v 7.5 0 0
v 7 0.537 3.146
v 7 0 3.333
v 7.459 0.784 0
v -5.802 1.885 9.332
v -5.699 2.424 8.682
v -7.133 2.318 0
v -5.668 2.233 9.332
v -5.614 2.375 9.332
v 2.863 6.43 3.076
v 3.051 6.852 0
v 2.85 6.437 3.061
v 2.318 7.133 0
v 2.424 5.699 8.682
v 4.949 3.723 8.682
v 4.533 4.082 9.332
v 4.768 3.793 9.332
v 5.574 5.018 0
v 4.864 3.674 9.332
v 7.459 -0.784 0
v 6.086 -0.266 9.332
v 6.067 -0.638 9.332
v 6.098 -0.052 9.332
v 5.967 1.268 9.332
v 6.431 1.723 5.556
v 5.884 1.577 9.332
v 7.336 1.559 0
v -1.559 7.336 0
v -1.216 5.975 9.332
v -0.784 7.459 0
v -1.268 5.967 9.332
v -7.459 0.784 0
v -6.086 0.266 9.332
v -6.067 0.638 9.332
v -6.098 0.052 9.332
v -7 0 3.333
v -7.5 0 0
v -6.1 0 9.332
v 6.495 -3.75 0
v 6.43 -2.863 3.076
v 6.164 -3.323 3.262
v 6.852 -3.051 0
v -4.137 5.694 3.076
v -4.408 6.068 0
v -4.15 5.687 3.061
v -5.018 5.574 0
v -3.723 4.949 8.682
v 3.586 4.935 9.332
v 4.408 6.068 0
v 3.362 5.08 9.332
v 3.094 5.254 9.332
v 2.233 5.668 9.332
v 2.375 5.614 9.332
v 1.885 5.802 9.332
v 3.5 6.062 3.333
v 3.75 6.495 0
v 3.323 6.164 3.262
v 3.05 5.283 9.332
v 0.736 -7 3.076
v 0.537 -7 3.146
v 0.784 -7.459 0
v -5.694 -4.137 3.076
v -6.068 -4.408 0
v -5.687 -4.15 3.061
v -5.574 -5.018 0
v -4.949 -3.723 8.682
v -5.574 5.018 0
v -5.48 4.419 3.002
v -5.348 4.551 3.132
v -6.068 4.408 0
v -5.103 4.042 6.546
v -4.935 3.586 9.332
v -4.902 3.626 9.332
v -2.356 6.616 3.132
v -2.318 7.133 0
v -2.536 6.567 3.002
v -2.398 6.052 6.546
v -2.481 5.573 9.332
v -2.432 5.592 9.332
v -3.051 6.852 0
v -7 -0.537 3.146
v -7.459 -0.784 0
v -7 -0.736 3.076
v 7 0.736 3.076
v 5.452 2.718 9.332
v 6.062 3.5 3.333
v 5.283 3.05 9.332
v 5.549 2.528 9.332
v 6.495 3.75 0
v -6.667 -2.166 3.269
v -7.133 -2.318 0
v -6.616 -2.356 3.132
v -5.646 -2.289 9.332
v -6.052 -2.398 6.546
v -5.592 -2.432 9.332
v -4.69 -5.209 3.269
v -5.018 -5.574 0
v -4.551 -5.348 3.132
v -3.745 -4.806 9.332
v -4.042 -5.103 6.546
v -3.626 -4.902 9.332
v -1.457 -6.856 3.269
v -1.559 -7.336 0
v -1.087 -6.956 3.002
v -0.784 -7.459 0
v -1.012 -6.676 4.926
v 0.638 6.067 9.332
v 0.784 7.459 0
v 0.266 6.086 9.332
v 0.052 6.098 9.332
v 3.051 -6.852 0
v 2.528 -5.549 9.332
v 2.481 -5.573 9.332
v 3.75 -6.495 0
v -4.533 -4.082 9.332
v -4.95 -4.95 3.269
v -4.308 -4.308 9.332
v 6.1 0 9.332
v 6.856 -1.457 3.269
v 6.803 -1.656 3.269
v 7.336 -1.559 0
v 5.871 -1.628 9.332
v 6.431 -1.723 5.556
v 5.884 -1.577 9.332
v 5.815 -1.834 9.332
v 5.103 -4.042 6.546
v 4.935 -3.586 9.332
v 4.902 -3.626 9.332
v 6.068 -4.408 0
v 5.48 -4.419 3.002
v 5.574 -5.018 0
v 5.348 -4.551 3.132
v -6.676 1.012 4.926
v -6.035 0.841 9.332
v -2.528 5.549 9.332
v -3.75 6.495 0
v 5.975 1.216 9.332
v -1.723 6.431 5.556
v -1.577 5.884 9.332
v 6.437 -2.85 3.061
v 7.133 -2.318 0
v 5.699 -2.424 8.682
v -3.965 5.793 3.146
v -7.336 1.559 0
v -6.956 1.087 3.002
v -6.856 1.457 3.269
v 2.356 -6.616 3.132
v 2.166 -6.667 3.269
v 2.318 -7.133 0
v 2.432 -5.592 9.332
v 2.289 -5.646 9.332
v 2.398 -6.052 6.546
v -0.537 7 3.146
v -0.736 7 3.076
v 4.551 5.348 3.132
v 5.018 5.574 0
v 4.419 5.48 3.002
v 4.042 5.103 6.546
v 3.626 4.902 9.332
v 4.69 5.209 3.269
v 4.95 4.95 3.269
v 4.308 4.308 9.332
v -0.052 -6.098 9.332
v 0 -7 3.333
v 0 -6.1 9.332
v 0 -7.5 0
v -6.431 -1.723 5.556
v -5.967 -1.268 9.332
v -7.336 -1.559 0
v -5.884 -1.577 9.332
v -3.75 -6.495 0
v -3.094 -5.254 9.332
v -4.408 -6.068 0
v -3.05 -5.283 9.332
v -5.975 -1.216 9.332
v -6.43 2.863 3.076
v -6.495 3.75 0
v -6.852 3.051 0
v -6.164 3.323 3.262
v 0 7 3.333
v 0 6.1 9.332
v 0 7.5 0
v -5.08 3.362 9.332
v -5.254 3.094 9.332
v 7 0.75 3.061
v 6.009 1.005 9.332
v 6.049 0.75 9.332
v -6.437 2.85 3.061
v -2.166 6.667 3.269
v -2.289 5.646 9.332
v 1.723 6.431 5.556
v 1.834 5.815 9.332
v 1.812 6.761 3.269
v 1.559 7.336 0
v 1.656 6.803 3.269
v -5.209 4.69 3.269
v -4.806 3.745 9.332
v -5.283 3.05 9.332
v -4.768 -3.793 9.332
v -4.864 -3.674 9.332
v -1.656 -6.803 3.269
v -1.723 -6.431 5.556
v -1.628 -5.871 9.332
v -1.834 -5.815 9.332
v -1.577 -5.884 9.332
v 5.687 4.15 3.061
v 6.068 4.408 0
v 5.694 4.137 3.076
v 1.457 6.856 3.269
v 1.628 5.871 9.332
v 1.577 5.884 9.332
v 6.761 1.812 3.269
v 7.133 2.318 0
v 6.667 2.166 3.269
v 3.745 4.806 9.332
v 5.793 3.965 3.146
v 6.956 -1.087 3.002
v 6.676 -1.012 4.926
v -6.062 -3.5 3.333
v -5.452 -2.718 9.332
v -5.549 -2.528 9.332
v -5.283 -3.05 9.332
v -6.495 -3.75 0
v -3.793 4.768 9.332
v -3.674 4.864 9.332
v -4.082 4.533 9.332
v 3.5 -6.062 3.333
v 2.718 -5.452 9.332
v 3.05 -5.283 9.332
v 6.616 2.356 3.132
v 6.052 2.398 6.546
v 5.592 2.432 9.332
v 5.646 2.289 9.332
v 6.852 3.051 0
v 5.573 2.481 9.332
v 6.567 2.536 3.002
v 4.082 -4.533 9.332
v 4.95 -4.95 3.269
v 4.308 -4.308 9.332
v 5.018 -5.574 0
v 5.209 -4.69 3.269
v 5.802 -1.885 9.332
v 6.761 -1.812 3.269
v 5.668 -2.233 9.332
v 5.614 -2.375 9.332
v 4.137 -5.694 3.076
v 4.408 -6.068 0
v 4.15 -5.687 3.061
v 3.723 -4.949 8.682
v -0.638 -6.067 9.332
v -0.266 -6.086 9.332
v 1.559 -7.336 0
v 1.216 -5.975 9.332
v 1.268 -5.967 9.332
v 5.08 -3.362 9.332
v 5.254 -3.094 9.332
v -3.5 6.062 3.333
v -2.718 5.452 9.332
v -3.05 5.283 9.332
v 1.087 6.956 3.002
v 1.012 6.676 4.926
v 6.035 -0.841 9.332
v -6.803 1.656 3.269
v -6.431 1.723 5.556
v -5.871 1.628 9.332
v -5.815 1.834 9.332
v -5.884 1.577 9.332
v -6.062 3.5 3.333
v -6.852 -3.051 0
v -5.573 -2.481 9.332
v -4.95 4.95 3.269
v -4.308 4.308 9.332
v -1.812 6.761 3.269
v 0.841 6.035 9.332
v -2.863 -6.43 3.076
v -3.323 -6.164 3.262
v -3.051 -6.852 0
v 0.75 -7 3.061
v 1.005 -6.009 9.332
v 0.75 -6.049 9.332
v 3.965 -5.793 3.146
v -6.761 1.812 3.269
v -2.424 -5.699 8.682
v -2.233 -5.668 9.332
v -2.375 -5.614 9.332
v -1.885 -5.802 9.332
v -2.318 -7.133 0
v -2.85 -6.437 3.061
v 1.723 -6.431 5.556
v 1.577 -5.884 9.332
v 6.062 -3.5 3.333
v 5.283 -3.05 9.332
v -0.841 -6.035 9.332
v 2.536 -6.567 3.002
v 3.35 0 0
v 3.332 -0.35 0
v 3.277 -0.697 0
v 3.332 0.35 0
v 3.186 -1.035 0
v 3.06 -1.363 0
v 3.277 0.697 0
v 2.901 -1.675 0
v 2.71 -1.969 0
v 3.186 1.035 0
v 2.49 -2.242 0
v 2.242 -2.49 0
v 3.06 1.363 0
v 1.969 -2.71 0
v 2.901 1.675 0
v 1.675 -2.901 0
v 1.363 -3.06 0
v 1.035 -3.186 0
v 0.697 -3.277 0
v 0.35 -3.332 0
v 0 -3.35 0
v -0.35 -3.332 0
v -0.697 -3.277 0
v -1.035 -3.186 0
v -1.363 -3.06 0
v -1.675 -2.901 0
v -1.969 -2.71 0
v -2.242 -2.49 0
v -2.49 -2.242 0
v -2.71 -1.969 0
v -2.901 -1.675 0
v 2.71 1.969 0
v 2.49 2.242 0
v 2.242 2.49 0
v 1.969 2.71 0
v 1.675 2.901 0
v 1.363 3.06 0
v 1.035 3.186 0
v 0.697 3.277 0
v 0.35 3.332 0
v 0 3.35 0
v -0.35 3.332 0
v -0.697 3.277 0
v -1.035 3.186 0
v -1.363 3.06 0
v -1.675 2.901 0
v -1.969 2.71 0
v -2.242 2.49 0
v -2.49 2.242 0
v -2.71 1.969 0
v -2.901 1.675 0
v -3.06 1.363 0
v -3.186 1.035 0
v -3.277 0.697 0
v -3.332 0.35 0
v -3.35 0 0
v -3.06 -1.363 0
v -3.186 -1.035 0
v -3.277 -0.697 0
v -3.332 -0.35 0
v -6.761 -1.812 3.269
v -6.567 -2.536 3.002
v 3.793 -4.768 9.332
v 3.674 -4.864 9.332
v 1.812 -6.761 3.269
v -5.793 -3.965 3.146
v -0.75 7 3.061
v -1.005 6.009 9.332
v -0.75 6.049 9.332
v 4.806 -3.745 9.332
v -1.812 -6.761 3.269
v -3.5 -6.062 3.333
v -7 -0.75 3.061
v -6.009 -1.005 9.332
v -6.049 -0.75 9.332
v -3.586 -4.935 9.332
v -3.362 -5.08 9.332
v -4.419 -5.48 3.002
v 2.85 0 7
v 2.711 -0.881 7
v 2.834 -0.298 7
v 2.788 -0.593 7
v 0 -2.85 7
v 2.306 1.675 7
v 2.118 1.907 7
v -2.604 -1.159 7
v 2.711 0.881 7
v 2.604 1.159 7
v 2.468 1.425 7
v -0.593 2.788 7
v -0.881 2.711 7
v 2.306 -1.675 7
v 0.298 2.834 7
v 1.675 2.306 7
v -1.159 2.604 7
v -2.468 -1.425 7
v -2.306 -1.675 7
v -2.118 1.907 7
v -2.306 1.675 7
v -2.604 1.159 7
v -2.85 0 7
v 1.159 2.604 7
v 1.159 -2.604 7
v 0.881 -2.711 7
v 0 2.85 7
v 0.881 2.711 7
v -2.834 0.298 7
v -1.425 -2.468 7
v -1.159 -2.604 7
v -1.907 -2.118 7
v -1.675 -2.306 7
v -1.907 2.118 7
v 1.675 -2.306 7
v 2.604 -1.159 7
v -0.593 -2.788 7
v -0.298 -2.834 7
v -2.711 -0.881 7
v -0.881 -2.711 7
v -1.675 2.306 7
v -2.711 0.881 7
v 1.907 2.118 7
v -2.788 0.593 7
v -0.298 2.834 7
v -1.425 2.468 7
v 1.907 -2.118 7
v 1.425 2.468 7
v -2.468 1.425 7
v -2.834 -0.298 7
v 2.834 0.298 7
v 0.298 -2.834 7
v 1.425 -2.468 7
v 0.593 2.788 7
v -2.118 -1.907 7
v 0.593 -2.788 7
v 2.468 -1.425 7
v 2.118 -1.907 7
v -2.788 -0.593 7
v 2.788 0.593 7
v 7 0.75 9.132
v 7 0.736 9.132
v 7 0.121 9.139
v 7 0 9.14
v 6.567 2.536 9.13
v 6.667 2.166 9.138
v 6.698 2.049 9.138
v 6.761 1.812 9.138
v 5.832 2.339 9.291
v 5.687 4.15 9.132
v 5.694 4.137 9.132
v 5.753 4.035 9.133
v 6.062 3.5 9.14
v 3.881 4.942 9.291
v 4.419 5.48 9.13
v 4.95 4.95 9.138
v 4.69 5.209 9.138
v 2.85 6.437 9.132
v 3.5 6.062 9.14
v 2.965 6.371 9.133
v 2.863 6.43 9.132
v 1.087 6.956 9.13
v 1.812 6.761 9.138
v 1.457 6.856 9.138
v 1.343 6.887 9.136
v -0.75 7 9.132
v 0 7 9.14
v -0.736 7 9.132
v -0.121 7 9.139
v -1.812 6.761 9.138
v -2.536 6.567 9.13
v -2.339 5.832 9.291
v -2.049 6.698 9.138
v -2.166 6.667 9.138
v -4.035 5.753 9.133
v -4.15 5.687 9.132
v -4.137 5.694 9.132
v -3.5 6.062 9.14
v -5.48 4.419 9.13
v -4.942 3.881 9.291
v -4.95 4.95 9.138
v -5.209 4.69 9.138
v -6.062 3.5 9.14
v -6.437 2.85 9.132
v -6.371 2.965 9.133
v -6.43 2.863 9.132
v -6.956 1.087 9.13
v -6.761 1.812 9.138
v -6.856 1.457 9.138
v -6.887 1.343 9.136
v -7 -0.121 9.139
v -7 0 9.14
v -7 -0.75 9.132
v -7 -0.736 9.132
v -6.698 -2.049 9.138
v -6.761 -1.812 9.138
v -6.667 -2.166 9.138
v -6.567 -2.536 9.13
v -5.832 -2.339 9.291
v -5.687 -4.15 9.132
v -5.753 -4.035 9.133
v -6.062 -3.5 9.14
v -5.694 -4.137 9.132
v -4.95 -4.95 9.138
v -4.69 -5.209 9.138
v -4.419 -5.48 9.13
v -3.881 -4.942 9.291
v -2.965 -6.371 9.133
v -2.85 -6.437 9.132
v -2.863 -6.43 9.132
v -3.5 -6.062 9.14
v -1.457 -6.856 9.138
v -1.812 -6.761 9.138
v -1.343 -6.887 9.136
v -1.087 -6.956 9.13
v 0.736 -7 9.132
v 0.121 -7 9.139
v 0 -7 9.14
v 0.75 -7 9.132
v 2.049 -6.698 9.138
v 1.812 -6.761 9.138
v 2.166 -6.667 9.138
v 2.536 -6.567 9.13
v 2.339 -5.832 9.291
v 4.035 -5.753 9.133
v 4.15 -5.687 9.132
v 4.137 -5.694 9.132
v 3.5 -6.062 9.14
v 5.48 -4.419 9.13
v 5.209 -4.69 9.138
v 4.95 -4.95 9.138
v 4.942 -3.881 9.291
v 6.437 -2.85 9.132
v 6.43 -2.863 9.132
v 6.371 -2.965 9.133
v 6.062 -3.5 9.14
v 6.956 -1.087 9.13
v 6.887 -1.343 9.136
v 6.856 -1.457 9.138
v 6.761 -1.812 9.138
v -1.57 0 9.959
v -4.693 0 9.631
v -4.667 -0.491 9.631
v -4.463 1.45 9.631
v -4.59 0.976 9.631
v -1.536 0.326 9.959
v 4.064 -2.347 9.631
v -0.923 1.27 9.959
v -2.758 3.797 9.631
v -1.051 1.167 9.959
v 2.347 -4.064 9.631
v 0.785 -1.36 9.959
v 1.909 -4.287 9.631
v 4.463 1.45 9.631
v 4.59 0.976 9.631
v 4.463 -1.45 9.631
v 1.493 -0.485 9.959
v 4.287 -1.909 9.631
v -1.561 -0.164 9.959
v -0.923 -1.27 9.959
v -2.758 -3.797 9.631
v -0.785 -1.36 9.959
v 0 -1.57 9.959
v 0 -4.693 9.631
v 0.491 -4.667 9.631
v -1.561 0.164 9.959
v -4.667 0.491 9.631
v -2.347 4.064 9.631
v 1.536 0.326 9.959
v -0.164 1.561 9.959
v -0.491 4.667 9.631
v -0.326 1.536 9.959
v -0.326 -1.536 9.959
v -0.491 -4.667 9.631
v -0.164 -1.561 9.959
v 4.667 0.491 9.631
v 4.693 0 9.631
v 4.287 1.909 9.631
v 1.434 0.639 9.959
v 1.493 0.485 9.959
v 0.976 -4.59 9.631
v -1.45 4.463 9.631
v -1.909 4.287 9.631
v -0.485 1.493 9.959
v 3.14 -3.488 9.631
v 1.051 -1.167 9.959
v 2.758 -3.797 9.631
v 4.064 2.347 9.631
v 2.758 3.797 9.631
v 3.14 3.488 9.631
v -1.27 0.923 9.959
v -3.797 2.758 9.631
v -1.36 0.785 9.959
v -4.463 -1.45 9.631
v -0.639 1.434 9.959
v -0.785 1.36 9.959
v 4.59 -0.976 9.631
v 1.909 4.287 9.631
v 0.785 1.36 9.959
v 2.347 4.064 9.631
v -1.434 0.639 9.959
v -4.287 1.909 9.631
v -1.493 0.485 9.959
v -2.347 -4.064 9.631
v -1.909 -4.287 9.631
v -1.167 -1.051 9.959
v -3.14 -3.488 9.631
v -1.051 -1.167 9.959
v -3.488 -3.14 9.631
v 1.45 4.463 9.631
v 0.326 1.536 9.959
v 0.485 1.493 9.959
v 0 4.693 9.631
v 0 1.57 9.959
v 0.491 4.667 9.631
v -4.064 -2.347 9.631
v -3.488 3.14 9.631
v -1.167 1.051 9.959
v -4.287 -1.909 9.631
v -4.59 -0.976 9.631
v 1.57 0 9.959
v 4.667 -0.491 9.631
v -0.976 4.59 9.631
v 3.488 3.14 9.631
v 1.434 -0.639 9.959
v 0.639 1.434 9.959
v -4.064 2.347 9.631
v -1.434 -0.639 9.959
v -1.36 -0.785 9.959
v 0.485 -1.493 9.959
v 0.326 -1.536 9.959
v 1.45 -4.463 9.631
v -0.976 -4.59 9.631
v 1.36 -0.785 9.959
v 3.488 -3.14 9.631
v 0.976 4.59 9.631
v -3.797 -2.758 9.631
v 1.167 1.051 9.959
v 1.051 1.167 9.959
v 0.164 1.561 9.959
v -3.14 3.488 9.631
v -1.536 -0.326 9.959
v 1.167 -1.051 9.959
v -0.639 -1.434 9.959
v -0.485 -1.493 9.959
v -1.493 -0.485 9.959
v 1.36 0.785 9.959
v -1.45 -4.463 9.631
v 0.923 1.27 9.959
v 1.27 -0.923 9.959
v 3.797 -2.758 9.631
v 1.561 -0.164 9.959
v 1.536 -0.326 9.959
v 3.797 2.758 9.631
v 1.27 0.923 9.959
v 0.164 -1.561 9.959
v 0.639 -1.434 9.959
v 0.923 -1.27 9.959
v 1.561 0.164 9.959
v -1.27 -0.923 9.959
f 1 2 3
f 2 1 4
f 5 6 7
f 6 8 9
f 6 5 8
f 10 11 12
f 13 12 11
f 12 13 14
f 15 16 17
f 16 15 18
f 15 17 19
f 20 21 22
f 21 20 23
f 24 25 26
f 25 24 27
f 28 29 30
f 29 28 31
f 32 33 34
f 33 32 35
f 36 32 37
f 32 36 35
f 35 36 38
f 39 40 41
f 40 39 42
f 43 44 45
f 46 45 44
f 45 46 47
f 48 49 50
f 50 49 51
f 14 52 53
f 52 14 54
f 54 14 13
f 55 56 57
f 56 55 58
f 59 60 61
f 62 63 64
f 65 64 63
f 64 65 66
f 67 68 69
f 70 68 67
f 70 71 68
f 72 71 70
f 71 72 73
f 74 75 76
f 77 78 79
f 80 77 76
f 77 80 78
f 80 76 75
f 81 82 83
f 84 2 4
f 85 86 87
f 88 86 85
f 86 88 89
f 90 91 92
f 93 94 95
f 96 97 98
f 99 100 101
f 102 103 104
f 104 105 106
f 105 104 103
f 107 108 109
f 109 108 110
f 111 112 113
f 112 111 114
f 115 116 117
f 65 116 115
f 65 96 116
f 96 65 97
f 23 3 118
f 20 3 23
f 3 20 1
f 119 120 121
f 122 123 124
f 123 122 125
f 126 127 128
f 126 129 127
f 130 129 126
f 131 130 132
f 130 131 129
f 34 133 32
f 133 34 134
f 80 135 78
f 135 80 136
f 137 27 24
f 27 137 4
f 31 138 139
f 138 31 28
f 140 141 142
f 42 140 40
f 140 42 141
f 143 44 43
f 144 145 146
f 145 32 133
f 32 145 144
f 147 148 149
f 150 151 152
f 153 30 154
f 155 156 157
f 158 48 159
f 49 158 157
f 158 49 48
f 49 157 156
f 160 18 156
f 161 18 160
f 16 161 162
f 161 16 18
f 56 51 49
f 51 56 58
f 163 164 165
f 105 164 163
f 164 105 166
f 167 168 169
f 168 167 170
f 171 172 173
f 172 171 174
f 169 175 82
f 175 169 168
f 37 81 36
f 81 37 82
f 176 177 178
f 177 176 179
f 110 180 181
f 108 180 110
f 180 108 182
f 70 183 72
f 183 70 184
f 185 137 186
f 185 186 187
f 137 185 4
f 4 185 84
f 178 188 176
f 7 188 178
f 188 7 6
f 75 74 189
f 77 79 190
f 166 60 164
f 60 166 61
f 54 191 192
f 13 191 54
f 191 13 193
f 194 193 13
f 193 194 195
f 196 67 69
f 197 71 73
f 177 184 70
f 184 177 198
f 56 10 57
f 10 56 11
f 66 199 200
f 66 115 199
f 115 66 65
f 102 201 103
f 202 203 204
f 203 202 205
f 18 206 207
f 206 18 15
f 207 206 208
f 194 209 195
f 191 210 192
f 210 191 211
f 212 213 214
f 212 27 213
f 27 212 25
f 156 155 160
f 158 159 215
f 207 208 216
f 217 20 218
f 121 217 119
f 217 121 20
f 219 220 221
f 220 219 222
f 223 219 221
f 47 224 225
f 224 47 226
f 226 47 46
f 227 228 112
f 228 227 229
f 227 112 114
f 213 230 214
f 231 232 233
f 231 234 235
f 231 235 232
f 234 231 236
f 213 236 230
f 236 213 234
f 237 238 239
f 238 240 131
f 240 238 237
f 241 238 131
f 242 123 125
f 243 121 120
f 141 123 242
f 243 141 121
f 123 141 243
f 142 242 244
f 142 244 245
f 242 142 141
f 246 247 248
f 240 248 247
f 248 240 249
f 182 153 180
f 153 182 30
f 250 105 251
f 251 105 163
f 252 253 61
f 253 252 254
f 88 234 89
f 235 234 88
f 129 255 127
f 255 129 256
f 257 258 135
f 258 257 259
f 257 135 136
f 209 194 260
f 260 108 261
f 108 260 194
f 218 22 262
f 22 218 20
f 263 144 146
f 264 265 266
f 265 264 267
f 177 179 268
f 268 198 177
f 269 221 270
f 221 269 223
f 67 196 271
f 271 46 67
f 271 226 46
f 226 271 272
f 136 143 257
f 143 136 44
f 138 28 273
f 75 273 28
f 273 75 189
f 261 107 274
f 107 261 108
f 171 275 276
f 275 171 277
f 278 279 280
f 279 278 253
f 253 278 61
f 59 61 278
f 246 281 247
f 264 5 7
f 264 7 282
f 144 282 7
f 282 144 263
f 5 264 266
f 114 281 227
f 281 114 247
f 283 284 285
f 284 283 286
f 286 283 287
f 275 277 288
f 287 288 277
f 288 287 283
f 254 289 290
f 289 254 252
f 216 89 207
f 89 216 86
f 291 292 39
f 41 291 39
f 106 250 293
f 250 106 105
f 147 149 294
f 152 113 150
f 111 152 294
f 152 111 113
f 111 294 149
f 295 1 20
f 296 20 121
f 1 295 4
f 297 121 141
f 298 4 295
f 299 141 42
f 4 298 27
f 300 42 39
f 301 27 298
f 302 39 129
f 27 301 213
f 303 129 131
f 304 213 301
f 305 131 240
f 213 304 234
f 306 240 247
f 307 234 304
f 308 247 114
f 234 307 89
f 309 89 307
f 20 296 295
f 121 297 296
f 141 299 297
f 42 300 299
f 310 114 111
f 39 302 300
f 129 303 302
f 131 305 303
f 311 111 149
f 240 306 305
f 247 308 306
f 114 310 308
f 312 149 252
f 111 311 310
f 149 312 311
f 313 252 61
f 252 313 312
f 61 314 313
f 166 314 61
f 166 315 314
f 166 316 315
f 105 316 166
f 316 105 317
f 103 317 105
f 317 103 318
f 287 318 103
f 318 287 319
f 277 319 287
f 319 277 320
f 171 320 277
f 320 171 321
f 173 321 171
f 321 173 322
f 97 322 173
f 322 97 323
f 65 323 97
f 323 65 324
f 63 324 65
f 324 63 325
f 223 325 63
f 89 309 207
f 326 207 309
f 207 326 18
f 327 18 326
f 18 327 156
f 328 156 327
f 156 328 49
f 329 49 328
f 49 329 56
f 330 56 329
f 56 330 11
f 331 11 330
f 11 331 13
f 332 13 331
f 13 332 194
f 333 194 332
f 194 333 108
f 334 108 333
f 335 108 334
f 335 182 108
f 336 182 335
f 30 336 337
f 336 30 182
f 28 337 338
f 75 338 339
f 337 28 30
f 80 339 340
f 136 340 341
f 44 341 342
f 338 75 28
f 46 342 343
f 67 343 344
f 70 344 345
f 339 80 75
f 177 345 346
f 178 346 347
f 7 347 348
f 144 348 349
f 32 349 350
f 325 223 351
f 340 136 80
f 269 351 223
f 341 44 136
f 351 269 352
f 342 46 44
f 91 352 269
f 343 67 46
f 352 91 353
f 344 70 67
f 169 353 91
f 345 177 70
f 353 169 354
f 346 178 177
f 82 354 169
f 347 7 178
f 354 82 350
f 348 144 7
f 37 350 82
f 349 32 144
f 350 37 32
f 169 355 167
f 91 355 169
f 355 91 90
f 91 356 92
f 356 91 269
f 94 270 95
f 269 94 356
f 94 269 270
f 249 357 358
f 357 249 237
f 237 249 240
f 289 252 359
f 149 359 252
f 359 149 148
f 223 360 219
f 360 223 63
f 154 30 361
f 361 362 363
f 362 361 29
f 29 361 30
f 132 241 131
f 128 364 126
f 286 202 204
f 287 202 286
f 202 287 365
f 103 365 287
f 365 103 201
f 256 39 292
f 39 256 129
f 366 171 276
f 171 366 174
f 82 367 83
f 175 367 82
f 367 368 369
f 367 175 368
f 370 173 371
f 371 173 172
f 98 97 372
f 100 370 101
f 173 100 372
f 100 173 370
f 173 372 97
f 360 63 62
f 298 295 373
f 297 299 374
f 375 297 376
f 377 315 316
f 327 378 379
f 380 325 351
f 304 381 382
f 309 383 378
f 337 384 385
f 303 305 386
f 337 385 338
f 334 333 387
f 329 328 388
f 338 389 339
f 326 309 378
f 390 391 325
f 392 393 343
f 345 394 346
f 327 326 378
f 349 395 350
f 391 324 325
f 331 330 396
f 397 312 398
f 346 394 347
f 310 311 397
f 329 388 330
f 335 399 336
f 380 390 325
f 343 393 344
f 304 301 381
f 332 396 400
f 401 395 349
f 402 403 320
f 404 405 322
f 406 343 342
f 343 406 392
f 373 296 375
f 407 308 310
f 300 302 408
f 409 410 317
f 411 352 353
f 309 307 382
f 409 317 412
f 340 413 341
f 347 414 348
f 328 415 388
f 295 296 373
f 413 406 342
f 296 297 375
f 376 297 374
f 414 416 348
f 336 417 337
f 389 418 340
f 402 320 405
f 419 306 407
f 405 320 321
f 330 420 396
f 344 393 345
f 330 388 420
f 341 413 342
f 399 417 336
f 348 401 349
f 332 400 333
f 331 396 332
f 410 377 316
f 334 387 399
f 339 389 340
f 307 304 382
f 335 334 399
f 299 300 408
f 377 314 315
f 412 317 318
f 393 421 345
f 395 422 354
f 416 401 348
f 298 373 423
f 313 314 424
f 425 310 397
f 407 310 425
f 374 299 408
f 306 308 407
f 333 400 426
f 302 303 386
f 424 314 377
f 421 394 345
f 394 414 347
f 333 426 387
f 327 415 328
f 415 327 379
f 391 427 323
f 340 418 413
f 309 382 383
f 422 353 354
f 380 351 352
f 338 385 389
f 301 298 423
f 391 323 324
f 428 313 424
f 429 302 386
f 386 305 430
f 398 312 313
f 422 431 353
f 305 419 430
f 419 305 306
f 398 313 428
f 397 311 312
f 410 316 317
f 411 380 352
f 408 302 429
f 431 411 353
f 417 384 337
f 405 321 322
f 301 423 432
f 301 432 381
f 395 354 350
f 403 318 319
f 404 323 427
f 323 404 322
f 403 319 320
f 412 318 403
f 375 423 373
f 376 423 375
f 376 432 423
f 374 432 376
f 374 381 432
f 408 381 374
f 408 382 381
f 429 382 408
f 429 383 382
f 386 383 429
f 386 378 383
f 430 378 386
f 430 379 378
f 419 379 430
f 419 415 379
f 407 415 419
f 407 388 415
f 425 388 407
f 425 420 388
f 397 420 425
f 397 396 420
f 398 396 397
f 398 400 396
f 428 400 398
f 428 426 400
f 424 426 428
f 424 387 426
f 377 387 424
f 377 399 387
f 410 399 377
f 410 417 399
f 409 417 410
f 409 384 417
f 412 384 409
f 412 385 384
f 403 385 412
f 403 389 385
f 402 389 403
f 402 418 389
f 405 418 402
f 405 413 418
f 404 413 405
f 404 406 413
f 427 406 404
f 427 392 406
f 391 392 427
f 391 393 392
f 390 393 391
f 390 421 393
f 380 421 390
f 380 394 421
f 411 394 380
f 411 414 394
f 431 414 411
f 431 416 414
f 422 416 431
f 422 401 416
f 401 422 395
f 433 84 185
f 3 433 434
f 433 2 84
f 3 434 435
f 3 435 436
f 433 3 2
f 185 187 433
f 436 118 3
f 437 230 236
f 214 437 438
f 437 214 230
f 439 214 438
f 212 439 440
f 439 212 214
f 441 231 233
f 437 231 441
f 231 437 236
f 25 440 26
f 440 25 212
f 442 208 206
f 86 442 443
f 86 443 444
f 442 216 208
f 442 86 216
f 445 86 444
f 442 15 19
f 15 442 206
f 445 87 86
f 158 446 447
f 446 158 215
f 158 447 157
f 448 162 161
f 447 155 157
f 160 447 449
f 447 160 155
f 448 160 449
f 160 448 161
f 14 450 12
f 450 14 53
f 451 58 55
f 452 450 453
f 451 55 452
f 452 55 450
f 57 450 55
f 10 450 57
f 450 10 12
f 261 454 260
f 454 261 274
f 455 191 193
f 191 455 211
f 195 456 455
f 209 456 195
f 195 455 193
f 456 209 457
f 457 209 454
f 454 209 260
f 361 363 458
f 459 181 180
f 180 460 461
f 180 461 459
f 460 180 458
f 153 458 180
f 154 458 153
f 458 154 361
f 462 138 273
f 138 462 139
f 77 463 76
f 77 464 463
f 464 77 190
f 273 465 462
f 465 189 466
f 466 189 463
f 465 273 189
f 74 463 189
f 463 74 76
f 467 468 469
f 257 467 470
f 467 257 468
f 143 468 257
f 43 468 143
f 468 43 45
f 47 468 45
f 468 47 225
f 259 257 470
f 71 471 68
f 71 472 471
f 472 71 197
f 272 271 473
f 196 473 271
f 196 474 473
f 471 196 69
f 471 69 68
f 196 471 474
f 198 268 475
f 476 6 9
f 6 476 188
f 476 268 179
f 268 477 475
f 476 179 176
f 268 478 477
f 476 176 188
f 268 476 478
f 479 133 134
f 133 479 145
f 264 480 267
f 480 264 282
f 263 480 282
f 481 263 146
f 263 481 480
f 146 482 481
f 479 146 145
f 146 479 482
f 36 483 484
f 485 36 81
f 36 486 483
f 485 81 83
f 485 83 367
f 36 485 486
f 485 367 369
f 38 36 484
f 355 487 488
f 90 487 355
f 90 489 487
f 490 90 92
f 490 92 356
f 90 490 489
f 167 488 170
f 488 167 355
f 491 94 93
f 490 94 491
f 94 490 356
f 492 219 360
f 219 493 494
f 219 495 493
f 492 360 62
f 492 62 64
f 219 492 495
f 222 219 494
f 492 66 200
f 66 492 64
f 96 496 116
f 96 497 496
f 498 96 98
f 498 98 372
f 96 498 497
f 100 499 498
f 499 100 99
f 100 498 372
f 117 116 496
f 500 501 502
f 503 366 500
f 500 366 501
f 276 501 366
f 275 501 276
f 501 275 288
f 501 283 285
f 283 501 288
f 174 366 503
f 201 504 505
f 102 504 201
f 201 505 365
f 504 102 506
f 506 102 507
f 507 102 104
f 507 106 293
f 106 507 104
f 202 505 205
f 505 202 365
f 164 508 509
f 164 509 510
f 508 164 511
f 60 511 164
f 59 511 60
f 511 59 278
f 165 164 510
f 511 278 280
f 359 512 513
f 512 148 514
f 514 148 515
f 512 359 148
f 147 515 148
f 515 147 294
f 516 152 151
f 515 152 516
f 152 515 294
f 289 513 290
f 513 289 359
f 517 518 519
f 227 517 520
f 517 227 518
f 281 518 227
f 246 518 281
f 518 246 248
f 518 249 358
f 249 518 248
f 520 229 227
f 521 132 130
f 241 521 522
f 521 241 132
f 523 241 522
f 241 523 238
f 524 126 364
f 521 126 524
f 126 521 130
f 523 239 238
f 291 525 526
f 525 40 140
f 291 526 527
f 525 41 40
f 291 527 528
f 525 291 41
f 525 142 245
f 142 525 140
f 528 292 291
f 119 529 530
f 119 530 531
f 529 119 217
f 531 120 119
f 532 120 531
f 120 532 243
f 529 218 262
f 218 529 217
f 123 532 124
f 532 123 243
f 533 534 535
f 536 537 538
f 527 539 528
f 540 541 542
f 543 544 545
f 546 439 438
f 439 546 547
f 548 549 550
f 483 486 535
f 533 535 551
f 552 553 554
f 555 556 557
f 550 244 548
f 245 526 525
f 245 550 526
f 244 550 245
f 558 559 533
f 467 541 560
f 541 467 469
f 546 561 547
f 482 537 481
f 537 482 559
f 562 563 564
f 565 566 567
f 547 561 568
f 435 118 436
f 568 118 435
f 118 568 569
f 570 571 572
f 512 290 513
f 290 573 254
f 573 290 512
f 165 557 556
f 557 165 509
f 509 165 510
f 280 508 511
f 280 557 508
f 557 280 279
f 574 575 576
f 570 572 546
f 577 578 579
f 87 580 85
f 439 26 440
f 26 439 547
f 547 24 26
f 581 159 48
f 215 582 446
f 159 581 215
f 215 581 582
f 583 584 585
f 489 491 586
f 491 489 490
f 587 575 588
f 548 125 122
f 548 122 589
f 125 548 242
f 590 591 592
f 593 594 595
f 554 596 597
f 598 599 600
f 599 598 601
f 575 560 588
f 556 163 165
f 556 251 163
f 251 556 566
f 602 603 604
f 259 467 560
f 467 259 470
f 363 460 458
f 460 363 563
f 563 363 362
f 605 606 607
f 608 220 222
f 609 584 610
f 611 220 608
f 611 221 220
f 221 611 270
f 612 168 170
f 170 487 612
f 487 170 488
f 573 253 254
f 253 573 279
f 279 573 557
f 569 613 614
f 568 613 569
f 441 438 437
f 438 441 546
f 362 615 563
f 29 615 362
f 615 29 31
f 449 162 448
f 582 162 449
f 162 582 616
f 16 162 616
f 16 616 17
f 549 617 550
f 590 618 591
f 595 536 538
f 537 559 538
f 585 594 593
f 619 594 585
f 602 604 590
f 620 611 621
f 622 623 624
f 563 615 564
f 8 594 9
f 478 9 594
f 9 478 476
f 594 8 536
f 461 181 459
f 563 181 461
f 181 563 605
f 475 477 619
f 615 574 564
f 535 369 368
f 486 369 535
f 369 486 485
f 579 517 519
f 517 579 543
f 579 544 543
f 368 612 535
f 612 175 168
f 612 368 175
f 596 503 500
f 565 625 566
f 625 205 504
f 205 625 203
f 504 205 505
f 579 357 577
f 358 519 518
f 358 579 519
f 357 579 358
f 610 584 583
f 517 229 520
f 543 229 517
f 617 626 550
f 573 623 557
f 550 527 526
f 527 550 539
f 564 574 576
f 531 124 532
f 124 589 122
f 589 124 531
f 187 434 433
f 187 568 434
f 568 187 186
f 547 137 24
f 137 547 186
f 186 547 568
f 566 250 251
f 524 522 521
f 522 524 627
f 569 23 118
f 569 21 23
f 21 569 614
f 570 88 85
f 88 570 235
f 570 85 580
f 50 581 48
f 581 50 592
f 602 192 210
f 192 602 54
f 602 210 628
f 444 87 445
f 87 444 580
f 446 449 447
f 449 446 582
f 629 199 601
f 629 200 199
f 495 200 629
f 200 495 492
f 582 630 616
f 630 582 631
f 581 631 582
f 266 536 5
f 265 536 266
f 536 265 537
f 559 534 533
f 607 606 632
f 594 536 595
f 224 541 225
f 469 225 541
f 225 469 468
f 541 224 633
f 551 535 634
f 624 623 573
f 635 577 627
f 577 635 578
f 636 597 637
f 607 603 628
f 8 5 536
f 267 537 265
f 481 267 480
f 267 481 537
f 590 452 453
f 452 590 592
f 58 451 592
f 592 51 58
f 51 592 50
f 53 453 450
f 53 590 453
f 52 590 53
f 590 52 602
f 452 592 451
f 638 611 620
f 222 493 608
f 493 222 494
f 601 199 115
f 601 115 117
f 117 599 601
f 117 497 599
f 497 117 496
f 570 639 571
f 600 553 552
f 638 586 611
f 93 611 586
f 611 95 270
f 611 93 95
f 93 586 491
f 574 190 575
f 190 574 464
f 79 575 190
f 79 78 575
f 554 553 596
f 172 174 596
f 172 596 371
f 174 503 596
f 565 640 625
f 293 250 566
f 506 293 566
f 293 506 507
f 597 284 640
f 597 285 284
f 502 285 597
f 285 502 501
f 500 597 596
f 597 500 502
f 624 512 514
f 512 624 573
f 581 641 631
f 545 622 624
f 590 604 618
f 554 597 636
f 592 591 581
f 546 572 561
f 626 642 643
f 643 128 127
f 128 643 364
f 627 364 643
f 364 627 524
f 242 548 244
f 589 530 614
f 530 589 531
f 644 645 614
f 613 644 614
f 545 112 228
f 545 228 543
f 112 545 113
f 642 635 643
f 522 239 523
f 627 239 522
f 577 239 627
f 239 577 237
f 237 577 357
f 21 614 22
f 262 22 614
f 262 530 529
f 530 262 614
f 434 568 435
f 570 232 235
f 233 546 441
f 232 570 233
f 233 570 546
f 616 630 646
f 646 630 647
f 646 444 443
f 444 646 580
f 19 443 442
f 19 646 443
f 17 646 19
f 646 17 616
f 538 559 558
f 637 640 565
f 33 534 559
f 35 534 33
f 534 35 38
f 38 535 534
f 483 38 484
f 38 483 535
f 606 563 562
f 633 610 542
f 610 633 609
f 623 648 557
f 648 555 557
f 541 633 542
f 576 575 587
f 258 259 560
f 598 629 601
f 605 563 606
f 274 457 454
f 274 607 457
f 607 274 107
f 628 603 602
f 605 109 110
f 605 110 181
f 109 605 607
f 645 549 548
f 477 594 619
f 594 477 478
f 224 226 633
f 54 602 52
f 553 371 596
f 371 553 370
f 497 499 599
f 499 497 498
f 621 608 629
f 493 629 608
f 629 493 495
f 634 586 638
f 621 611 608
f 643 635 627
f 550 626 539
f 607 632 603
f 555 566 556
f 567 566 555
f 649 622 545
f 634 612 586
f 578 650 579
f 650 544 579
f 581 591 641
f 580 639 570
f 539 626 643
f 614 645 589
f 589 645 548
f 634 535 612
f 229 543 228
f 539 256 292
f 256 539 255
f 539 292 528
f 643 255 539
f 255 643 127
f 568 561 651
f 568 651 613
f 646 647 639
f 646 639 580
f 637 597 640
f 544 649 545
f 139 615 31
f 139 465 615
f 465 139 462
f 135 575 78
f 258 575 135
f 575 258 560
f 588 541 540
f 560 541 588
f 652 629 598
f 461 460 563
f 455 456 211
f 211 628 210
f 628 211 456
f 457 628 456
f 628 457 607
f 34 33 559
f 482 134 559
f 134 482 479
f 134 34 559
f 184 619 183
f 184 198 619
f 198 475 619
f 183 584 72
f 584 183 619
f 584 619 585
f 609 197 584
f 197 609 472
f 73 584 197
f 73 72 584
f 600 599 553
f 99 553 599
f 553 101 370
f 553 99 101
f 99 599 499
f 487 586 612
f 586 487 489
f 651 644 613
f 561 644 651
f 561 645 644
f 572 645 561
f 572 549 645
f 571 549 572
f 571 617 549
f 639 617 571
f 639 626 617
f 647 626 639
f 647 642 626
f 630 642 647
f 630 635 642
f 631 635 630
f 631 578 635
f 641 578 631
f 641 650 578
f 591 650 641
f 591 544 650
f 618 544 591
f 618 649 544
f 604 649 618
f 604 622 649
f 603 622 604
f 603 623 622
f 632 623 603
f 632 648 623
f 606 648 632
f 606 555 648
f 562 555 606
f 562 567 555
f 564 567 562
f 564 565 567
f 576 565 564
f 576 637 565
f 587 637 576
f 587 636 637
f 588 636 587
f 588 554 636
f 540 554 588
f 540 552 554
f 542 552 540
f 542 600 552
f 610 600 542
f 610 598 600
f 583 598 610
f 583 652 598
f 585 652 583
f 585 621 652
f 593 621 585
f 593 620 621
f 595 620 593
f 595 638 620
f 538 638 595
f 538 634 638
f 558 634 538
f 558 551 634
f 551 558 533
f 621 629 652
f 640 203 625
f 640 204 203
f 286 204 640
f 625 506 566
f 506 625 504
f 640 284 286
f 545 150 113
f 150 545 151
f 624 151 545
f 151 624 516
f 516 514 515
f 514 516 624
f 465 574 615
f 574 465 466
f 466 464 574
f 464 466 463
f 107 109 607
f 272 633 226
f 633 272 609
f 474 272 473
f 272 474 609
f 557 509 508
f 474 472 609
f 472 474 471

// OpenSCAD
surroundHeight= 10;
radius = 6;
innerRadius = 5.7/2;
deep = 7;

intersection(){

    union(){
	
	difference(){
		cylinder(r1=radius+1.5,r2=radius, h=surroundHeight,$fn=60);
		cylinder(r1=innerRadius+0.5, r2=innerRadius, h=deep, $fn=60);
	}

	for (i=[0:15:360]) rotate([0,0,i]) 
		translate([radius-2,0,0])
		cube([3,0.75,surroundHeight]);

    }

	translate([0,0,-20])sphere(r=20+surroundHeight,$fn=60);

}
